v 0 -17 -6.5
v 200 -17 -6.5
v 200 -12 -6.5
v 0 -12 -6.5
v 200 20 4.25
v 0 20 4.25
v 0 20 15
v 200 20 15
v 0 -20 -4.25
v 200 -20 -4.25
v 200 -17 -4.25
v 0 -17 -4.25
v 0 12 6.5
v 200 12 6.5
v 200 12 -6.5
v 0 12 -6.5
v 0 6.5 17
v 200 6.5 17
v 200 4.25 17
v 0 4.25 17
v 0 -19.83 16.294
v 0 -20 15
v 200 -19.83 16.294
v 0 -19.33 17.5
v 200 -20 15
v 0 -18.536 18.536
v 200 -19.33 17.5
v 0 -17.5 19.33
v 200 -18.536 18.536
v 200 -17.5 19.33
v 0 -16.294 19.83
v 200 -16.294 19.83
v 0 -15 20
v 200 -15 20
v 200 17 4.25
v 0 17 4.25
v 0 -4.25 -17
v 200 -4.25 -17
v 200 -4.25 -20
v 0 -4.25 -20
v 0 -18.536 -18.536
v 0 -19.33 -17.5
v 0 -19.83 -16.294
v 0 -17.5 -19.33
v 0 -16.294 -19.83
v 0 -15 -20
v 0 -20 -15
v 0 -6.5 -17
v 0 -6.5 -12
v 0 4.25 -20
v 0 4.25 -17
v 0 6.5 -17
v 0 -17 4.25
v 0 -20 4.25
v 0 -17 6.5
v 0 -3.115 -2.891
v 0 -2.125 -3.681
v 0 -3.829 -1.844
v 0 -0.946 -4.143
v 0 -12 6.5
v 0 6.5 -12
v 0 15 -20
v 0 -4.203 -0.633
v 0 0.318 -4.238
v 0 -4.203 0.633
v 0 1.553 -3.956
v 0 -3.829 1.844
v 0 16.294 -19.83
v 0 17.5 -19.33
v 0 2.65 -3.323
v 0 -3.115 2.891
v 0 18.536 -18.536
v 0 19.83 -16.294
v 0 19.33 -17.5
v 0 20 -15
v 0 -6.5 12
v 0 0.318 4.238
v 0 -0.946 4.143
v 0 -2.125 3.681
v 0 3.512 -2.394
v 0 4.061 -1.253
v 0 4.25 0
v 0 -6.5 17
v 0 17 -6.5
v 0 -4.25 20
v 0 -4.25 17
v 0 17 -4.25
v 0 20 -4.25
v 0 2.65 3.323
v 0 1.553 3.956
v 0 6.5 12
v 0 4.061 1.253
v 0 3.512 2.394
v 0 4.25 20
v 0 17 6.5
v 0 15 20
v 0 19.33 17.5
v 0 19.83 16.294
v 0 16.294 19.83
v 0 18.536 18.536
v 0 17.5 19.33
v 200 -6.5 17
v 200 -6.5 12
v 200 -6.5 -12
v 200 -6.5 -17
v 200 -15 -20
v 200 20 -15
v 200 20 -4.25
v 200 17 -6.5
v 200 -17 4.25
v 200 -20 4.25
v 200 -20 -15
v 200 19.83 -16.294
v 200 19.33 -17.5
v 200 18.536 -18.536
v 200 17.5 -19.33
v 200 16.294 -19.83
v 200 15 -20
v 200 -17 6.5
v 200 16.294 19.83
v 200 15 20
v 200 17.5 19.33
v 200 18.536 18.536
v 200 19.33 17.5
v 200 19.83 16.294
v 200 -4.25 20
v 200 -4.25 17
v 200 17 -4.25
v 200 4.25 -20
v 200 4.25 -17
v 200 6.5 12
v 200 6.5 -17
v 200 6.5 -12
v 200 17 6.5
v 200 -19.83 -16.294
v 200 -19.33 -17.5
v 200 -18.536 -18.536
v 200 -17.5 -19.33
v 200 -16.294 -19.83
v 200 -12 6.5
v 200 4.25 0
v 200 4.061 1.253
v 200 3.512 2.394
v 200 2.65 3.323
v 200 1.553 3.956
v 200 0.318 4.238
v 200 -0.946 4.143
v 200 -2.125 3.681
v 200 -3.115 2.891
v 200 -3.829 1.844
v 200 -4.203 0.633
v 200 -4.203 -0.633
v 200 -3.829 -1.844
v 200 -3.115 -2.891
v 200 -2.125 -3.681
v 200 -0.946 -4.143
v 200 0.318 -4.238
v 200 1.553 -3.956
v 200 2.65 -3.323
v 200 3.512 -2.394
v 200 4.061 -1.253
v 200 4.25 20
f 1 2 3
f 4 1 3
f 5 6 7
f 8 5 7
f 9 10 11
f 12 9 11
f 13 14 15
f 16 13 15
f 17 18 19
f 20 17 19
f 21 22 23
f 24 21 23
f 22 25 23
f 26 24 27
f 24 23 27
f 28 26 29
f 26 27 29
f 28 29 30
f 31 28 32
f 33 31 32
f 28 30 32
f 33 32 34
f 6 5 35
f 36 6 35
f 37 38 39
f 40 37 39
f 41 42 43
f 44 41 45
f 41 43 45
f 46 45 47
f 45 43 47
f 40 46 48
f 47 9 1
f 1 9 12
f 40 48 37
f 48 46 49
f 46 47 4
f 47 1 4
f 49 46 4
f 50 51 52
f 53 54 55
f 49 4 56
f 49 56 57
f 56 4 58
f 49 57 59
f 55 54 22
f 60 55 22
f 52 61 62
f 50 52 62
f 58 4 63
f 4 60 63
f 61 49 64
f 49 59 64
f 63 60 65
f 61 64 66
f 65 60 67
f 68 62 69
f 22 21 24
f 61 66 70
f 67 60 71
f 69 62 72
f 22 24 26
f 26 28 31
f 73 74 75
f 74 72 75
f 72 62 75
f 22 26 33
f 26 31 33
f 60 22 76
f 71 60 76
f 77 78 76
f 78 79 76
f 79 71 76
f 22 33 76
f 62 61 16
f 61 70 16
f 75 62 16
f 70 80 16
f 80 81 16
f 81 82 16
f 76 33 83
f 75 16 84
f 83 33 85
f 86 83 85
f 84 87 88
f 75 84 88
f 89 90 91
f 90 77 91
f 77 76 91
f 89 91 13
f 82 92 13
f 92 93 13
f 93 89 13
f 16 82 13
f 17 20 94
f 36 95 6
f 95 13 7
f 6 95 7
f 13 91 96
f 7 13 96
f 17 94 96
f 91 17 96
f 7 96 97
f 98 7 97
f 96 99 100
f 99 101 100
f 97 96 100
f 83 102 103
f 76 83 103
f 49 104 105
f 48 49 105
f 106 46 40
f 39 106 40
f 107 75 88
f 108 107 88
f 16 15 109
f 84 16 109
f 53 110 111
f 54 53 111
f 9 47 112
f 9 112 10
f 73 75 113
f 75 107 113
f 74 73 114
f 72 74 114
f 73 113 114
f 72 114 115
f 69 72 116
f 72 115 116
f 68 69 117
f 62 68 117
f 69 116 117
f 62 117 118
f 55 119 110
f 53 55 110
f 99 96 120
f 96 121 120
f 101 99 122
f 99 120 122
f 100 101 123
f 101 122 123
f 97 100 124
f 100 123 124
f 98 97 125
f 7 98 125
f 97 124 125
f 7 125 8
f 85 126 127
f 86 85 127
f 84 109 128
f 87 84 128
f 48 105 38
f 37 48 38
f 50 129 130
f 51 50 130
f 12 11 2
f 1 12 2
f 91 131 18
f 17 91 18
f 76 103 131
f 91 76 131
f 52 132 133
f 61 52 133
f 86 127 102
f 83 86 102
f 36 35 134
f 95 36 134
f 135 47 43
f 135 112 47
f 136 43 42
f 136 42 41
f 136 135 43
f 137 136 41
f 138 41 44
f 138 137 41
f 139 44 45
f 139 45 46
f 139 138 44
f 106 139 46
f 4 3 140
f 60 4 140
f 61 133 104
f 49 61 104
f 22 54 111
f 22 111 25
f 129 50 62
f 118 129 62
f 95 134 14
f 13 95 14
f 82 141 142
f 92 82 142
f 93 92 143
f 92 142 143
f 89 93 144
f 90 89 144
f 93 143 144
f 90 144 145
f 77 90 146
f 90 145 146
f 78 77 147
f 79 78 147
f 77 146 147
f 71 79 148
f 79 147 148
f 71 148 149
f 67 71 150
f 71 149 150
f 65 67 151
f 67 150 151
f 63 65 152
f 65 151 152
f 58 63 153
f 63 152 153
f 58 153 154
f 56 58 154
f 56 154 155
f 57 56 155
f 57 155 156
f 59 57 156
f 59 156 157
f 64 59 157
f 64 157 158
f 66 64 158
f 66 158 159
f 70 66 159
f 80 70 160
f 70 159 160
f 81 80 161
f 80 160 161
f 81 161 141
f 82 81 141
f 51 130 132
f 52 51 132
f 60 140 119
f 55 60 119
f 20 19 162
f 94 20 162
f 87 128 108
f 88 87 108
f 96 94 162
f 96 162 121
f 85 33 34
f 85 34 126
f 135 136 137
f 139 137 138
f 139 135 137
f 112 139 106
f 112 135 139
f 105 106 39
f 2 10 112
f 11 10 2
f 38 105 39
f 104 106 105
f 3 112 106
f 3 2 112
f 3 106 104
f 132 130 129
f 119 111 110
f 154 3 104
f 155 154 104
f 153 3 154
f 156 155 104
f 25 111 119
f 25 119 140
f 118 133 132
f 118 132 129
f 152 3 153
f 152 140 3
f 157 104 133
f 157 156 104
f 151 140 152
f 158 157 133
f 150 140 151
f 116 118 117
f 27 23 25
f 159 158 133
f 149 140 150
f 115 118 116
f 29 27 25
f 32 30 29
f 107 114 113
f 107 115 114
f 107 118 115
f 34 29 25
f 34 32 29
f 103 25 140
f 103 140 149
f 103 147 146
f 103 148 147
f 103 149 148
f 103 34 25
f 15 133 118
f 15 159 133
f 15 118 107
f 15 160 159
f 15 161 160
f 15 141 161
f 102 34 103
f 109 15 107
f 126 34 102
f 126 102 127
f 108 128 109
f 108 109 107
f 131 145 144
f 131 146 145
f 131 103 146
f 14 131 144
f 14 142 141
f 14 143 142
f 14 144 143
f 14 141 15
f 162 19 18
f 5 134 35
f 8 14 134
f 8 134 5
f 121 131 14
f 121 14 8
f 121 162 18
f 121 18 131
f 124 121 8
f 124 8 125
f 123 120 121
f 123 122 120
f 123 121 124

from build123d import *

# Parameters (mm, degrees)
F0_W            = 40
F0_H            = 40
F1_DEPTH        = 200
F3_DEPTH        = 200
F3_COPIES_COUNT = 4
F4_R            = 5
F5_R            = 4.25
F6_DEPTH        = 200


# Not quite as in the source:
# - a pattern or mirror of a feature is missing from the dataset's text; its kind, count and spacing are read off the source's solid


with BuildPart() as f1:
    # F0 (on Right) → F1 (new body)
    with BuildSketch(Plane.YZ):
        Rectangle(F0_W, F0_H)
    extrude(amount=F1_DEPTH)

    # F2 (on face) → F3 (cut, through all)
    with BuildSketch(Plane.YZ.offset(200)):
        Polygon((4.25, 20), (-4.25, 20), (-4.25, 17), (-6.5, 17), (-6.5, 12), (6.5, 12), (6.5, 17), (4.25, 17), align=None)
    f3 = extrude(amount=-F3_DEPTH, mode=Mode.SUBTRACT)

    # F3_copies: F3 ×4 about axis
    f3_copies_axis = Axis((0, 0, 0), (1, 0, 0))
    for i in range(1, F3_COPIES_COUNT):
        add(f3.rotate(f3_copies_axis, i * 360 / F3_COPIES_COUNT), mode=Mode.SUBTRACT)

    # F4
    f4_edges = [f1.edges().sort_by_distance(p)[0] for p in [
        (100, 20, 20),
        (100, -20, 20),
        (100, 20, -20),
        (100, -20, -20),
    ]]
    fillet(f4_edges, radius=F4_R)

    # F5 (on face) → F6 (cut, through all)
    with BuildSketch(Plane.YZ.offset(200)):
        Circle(F5_R)
    extrude(amount=-F6_DEPTH, mode=Mode.SUBTRACT)


solid = f1.part
